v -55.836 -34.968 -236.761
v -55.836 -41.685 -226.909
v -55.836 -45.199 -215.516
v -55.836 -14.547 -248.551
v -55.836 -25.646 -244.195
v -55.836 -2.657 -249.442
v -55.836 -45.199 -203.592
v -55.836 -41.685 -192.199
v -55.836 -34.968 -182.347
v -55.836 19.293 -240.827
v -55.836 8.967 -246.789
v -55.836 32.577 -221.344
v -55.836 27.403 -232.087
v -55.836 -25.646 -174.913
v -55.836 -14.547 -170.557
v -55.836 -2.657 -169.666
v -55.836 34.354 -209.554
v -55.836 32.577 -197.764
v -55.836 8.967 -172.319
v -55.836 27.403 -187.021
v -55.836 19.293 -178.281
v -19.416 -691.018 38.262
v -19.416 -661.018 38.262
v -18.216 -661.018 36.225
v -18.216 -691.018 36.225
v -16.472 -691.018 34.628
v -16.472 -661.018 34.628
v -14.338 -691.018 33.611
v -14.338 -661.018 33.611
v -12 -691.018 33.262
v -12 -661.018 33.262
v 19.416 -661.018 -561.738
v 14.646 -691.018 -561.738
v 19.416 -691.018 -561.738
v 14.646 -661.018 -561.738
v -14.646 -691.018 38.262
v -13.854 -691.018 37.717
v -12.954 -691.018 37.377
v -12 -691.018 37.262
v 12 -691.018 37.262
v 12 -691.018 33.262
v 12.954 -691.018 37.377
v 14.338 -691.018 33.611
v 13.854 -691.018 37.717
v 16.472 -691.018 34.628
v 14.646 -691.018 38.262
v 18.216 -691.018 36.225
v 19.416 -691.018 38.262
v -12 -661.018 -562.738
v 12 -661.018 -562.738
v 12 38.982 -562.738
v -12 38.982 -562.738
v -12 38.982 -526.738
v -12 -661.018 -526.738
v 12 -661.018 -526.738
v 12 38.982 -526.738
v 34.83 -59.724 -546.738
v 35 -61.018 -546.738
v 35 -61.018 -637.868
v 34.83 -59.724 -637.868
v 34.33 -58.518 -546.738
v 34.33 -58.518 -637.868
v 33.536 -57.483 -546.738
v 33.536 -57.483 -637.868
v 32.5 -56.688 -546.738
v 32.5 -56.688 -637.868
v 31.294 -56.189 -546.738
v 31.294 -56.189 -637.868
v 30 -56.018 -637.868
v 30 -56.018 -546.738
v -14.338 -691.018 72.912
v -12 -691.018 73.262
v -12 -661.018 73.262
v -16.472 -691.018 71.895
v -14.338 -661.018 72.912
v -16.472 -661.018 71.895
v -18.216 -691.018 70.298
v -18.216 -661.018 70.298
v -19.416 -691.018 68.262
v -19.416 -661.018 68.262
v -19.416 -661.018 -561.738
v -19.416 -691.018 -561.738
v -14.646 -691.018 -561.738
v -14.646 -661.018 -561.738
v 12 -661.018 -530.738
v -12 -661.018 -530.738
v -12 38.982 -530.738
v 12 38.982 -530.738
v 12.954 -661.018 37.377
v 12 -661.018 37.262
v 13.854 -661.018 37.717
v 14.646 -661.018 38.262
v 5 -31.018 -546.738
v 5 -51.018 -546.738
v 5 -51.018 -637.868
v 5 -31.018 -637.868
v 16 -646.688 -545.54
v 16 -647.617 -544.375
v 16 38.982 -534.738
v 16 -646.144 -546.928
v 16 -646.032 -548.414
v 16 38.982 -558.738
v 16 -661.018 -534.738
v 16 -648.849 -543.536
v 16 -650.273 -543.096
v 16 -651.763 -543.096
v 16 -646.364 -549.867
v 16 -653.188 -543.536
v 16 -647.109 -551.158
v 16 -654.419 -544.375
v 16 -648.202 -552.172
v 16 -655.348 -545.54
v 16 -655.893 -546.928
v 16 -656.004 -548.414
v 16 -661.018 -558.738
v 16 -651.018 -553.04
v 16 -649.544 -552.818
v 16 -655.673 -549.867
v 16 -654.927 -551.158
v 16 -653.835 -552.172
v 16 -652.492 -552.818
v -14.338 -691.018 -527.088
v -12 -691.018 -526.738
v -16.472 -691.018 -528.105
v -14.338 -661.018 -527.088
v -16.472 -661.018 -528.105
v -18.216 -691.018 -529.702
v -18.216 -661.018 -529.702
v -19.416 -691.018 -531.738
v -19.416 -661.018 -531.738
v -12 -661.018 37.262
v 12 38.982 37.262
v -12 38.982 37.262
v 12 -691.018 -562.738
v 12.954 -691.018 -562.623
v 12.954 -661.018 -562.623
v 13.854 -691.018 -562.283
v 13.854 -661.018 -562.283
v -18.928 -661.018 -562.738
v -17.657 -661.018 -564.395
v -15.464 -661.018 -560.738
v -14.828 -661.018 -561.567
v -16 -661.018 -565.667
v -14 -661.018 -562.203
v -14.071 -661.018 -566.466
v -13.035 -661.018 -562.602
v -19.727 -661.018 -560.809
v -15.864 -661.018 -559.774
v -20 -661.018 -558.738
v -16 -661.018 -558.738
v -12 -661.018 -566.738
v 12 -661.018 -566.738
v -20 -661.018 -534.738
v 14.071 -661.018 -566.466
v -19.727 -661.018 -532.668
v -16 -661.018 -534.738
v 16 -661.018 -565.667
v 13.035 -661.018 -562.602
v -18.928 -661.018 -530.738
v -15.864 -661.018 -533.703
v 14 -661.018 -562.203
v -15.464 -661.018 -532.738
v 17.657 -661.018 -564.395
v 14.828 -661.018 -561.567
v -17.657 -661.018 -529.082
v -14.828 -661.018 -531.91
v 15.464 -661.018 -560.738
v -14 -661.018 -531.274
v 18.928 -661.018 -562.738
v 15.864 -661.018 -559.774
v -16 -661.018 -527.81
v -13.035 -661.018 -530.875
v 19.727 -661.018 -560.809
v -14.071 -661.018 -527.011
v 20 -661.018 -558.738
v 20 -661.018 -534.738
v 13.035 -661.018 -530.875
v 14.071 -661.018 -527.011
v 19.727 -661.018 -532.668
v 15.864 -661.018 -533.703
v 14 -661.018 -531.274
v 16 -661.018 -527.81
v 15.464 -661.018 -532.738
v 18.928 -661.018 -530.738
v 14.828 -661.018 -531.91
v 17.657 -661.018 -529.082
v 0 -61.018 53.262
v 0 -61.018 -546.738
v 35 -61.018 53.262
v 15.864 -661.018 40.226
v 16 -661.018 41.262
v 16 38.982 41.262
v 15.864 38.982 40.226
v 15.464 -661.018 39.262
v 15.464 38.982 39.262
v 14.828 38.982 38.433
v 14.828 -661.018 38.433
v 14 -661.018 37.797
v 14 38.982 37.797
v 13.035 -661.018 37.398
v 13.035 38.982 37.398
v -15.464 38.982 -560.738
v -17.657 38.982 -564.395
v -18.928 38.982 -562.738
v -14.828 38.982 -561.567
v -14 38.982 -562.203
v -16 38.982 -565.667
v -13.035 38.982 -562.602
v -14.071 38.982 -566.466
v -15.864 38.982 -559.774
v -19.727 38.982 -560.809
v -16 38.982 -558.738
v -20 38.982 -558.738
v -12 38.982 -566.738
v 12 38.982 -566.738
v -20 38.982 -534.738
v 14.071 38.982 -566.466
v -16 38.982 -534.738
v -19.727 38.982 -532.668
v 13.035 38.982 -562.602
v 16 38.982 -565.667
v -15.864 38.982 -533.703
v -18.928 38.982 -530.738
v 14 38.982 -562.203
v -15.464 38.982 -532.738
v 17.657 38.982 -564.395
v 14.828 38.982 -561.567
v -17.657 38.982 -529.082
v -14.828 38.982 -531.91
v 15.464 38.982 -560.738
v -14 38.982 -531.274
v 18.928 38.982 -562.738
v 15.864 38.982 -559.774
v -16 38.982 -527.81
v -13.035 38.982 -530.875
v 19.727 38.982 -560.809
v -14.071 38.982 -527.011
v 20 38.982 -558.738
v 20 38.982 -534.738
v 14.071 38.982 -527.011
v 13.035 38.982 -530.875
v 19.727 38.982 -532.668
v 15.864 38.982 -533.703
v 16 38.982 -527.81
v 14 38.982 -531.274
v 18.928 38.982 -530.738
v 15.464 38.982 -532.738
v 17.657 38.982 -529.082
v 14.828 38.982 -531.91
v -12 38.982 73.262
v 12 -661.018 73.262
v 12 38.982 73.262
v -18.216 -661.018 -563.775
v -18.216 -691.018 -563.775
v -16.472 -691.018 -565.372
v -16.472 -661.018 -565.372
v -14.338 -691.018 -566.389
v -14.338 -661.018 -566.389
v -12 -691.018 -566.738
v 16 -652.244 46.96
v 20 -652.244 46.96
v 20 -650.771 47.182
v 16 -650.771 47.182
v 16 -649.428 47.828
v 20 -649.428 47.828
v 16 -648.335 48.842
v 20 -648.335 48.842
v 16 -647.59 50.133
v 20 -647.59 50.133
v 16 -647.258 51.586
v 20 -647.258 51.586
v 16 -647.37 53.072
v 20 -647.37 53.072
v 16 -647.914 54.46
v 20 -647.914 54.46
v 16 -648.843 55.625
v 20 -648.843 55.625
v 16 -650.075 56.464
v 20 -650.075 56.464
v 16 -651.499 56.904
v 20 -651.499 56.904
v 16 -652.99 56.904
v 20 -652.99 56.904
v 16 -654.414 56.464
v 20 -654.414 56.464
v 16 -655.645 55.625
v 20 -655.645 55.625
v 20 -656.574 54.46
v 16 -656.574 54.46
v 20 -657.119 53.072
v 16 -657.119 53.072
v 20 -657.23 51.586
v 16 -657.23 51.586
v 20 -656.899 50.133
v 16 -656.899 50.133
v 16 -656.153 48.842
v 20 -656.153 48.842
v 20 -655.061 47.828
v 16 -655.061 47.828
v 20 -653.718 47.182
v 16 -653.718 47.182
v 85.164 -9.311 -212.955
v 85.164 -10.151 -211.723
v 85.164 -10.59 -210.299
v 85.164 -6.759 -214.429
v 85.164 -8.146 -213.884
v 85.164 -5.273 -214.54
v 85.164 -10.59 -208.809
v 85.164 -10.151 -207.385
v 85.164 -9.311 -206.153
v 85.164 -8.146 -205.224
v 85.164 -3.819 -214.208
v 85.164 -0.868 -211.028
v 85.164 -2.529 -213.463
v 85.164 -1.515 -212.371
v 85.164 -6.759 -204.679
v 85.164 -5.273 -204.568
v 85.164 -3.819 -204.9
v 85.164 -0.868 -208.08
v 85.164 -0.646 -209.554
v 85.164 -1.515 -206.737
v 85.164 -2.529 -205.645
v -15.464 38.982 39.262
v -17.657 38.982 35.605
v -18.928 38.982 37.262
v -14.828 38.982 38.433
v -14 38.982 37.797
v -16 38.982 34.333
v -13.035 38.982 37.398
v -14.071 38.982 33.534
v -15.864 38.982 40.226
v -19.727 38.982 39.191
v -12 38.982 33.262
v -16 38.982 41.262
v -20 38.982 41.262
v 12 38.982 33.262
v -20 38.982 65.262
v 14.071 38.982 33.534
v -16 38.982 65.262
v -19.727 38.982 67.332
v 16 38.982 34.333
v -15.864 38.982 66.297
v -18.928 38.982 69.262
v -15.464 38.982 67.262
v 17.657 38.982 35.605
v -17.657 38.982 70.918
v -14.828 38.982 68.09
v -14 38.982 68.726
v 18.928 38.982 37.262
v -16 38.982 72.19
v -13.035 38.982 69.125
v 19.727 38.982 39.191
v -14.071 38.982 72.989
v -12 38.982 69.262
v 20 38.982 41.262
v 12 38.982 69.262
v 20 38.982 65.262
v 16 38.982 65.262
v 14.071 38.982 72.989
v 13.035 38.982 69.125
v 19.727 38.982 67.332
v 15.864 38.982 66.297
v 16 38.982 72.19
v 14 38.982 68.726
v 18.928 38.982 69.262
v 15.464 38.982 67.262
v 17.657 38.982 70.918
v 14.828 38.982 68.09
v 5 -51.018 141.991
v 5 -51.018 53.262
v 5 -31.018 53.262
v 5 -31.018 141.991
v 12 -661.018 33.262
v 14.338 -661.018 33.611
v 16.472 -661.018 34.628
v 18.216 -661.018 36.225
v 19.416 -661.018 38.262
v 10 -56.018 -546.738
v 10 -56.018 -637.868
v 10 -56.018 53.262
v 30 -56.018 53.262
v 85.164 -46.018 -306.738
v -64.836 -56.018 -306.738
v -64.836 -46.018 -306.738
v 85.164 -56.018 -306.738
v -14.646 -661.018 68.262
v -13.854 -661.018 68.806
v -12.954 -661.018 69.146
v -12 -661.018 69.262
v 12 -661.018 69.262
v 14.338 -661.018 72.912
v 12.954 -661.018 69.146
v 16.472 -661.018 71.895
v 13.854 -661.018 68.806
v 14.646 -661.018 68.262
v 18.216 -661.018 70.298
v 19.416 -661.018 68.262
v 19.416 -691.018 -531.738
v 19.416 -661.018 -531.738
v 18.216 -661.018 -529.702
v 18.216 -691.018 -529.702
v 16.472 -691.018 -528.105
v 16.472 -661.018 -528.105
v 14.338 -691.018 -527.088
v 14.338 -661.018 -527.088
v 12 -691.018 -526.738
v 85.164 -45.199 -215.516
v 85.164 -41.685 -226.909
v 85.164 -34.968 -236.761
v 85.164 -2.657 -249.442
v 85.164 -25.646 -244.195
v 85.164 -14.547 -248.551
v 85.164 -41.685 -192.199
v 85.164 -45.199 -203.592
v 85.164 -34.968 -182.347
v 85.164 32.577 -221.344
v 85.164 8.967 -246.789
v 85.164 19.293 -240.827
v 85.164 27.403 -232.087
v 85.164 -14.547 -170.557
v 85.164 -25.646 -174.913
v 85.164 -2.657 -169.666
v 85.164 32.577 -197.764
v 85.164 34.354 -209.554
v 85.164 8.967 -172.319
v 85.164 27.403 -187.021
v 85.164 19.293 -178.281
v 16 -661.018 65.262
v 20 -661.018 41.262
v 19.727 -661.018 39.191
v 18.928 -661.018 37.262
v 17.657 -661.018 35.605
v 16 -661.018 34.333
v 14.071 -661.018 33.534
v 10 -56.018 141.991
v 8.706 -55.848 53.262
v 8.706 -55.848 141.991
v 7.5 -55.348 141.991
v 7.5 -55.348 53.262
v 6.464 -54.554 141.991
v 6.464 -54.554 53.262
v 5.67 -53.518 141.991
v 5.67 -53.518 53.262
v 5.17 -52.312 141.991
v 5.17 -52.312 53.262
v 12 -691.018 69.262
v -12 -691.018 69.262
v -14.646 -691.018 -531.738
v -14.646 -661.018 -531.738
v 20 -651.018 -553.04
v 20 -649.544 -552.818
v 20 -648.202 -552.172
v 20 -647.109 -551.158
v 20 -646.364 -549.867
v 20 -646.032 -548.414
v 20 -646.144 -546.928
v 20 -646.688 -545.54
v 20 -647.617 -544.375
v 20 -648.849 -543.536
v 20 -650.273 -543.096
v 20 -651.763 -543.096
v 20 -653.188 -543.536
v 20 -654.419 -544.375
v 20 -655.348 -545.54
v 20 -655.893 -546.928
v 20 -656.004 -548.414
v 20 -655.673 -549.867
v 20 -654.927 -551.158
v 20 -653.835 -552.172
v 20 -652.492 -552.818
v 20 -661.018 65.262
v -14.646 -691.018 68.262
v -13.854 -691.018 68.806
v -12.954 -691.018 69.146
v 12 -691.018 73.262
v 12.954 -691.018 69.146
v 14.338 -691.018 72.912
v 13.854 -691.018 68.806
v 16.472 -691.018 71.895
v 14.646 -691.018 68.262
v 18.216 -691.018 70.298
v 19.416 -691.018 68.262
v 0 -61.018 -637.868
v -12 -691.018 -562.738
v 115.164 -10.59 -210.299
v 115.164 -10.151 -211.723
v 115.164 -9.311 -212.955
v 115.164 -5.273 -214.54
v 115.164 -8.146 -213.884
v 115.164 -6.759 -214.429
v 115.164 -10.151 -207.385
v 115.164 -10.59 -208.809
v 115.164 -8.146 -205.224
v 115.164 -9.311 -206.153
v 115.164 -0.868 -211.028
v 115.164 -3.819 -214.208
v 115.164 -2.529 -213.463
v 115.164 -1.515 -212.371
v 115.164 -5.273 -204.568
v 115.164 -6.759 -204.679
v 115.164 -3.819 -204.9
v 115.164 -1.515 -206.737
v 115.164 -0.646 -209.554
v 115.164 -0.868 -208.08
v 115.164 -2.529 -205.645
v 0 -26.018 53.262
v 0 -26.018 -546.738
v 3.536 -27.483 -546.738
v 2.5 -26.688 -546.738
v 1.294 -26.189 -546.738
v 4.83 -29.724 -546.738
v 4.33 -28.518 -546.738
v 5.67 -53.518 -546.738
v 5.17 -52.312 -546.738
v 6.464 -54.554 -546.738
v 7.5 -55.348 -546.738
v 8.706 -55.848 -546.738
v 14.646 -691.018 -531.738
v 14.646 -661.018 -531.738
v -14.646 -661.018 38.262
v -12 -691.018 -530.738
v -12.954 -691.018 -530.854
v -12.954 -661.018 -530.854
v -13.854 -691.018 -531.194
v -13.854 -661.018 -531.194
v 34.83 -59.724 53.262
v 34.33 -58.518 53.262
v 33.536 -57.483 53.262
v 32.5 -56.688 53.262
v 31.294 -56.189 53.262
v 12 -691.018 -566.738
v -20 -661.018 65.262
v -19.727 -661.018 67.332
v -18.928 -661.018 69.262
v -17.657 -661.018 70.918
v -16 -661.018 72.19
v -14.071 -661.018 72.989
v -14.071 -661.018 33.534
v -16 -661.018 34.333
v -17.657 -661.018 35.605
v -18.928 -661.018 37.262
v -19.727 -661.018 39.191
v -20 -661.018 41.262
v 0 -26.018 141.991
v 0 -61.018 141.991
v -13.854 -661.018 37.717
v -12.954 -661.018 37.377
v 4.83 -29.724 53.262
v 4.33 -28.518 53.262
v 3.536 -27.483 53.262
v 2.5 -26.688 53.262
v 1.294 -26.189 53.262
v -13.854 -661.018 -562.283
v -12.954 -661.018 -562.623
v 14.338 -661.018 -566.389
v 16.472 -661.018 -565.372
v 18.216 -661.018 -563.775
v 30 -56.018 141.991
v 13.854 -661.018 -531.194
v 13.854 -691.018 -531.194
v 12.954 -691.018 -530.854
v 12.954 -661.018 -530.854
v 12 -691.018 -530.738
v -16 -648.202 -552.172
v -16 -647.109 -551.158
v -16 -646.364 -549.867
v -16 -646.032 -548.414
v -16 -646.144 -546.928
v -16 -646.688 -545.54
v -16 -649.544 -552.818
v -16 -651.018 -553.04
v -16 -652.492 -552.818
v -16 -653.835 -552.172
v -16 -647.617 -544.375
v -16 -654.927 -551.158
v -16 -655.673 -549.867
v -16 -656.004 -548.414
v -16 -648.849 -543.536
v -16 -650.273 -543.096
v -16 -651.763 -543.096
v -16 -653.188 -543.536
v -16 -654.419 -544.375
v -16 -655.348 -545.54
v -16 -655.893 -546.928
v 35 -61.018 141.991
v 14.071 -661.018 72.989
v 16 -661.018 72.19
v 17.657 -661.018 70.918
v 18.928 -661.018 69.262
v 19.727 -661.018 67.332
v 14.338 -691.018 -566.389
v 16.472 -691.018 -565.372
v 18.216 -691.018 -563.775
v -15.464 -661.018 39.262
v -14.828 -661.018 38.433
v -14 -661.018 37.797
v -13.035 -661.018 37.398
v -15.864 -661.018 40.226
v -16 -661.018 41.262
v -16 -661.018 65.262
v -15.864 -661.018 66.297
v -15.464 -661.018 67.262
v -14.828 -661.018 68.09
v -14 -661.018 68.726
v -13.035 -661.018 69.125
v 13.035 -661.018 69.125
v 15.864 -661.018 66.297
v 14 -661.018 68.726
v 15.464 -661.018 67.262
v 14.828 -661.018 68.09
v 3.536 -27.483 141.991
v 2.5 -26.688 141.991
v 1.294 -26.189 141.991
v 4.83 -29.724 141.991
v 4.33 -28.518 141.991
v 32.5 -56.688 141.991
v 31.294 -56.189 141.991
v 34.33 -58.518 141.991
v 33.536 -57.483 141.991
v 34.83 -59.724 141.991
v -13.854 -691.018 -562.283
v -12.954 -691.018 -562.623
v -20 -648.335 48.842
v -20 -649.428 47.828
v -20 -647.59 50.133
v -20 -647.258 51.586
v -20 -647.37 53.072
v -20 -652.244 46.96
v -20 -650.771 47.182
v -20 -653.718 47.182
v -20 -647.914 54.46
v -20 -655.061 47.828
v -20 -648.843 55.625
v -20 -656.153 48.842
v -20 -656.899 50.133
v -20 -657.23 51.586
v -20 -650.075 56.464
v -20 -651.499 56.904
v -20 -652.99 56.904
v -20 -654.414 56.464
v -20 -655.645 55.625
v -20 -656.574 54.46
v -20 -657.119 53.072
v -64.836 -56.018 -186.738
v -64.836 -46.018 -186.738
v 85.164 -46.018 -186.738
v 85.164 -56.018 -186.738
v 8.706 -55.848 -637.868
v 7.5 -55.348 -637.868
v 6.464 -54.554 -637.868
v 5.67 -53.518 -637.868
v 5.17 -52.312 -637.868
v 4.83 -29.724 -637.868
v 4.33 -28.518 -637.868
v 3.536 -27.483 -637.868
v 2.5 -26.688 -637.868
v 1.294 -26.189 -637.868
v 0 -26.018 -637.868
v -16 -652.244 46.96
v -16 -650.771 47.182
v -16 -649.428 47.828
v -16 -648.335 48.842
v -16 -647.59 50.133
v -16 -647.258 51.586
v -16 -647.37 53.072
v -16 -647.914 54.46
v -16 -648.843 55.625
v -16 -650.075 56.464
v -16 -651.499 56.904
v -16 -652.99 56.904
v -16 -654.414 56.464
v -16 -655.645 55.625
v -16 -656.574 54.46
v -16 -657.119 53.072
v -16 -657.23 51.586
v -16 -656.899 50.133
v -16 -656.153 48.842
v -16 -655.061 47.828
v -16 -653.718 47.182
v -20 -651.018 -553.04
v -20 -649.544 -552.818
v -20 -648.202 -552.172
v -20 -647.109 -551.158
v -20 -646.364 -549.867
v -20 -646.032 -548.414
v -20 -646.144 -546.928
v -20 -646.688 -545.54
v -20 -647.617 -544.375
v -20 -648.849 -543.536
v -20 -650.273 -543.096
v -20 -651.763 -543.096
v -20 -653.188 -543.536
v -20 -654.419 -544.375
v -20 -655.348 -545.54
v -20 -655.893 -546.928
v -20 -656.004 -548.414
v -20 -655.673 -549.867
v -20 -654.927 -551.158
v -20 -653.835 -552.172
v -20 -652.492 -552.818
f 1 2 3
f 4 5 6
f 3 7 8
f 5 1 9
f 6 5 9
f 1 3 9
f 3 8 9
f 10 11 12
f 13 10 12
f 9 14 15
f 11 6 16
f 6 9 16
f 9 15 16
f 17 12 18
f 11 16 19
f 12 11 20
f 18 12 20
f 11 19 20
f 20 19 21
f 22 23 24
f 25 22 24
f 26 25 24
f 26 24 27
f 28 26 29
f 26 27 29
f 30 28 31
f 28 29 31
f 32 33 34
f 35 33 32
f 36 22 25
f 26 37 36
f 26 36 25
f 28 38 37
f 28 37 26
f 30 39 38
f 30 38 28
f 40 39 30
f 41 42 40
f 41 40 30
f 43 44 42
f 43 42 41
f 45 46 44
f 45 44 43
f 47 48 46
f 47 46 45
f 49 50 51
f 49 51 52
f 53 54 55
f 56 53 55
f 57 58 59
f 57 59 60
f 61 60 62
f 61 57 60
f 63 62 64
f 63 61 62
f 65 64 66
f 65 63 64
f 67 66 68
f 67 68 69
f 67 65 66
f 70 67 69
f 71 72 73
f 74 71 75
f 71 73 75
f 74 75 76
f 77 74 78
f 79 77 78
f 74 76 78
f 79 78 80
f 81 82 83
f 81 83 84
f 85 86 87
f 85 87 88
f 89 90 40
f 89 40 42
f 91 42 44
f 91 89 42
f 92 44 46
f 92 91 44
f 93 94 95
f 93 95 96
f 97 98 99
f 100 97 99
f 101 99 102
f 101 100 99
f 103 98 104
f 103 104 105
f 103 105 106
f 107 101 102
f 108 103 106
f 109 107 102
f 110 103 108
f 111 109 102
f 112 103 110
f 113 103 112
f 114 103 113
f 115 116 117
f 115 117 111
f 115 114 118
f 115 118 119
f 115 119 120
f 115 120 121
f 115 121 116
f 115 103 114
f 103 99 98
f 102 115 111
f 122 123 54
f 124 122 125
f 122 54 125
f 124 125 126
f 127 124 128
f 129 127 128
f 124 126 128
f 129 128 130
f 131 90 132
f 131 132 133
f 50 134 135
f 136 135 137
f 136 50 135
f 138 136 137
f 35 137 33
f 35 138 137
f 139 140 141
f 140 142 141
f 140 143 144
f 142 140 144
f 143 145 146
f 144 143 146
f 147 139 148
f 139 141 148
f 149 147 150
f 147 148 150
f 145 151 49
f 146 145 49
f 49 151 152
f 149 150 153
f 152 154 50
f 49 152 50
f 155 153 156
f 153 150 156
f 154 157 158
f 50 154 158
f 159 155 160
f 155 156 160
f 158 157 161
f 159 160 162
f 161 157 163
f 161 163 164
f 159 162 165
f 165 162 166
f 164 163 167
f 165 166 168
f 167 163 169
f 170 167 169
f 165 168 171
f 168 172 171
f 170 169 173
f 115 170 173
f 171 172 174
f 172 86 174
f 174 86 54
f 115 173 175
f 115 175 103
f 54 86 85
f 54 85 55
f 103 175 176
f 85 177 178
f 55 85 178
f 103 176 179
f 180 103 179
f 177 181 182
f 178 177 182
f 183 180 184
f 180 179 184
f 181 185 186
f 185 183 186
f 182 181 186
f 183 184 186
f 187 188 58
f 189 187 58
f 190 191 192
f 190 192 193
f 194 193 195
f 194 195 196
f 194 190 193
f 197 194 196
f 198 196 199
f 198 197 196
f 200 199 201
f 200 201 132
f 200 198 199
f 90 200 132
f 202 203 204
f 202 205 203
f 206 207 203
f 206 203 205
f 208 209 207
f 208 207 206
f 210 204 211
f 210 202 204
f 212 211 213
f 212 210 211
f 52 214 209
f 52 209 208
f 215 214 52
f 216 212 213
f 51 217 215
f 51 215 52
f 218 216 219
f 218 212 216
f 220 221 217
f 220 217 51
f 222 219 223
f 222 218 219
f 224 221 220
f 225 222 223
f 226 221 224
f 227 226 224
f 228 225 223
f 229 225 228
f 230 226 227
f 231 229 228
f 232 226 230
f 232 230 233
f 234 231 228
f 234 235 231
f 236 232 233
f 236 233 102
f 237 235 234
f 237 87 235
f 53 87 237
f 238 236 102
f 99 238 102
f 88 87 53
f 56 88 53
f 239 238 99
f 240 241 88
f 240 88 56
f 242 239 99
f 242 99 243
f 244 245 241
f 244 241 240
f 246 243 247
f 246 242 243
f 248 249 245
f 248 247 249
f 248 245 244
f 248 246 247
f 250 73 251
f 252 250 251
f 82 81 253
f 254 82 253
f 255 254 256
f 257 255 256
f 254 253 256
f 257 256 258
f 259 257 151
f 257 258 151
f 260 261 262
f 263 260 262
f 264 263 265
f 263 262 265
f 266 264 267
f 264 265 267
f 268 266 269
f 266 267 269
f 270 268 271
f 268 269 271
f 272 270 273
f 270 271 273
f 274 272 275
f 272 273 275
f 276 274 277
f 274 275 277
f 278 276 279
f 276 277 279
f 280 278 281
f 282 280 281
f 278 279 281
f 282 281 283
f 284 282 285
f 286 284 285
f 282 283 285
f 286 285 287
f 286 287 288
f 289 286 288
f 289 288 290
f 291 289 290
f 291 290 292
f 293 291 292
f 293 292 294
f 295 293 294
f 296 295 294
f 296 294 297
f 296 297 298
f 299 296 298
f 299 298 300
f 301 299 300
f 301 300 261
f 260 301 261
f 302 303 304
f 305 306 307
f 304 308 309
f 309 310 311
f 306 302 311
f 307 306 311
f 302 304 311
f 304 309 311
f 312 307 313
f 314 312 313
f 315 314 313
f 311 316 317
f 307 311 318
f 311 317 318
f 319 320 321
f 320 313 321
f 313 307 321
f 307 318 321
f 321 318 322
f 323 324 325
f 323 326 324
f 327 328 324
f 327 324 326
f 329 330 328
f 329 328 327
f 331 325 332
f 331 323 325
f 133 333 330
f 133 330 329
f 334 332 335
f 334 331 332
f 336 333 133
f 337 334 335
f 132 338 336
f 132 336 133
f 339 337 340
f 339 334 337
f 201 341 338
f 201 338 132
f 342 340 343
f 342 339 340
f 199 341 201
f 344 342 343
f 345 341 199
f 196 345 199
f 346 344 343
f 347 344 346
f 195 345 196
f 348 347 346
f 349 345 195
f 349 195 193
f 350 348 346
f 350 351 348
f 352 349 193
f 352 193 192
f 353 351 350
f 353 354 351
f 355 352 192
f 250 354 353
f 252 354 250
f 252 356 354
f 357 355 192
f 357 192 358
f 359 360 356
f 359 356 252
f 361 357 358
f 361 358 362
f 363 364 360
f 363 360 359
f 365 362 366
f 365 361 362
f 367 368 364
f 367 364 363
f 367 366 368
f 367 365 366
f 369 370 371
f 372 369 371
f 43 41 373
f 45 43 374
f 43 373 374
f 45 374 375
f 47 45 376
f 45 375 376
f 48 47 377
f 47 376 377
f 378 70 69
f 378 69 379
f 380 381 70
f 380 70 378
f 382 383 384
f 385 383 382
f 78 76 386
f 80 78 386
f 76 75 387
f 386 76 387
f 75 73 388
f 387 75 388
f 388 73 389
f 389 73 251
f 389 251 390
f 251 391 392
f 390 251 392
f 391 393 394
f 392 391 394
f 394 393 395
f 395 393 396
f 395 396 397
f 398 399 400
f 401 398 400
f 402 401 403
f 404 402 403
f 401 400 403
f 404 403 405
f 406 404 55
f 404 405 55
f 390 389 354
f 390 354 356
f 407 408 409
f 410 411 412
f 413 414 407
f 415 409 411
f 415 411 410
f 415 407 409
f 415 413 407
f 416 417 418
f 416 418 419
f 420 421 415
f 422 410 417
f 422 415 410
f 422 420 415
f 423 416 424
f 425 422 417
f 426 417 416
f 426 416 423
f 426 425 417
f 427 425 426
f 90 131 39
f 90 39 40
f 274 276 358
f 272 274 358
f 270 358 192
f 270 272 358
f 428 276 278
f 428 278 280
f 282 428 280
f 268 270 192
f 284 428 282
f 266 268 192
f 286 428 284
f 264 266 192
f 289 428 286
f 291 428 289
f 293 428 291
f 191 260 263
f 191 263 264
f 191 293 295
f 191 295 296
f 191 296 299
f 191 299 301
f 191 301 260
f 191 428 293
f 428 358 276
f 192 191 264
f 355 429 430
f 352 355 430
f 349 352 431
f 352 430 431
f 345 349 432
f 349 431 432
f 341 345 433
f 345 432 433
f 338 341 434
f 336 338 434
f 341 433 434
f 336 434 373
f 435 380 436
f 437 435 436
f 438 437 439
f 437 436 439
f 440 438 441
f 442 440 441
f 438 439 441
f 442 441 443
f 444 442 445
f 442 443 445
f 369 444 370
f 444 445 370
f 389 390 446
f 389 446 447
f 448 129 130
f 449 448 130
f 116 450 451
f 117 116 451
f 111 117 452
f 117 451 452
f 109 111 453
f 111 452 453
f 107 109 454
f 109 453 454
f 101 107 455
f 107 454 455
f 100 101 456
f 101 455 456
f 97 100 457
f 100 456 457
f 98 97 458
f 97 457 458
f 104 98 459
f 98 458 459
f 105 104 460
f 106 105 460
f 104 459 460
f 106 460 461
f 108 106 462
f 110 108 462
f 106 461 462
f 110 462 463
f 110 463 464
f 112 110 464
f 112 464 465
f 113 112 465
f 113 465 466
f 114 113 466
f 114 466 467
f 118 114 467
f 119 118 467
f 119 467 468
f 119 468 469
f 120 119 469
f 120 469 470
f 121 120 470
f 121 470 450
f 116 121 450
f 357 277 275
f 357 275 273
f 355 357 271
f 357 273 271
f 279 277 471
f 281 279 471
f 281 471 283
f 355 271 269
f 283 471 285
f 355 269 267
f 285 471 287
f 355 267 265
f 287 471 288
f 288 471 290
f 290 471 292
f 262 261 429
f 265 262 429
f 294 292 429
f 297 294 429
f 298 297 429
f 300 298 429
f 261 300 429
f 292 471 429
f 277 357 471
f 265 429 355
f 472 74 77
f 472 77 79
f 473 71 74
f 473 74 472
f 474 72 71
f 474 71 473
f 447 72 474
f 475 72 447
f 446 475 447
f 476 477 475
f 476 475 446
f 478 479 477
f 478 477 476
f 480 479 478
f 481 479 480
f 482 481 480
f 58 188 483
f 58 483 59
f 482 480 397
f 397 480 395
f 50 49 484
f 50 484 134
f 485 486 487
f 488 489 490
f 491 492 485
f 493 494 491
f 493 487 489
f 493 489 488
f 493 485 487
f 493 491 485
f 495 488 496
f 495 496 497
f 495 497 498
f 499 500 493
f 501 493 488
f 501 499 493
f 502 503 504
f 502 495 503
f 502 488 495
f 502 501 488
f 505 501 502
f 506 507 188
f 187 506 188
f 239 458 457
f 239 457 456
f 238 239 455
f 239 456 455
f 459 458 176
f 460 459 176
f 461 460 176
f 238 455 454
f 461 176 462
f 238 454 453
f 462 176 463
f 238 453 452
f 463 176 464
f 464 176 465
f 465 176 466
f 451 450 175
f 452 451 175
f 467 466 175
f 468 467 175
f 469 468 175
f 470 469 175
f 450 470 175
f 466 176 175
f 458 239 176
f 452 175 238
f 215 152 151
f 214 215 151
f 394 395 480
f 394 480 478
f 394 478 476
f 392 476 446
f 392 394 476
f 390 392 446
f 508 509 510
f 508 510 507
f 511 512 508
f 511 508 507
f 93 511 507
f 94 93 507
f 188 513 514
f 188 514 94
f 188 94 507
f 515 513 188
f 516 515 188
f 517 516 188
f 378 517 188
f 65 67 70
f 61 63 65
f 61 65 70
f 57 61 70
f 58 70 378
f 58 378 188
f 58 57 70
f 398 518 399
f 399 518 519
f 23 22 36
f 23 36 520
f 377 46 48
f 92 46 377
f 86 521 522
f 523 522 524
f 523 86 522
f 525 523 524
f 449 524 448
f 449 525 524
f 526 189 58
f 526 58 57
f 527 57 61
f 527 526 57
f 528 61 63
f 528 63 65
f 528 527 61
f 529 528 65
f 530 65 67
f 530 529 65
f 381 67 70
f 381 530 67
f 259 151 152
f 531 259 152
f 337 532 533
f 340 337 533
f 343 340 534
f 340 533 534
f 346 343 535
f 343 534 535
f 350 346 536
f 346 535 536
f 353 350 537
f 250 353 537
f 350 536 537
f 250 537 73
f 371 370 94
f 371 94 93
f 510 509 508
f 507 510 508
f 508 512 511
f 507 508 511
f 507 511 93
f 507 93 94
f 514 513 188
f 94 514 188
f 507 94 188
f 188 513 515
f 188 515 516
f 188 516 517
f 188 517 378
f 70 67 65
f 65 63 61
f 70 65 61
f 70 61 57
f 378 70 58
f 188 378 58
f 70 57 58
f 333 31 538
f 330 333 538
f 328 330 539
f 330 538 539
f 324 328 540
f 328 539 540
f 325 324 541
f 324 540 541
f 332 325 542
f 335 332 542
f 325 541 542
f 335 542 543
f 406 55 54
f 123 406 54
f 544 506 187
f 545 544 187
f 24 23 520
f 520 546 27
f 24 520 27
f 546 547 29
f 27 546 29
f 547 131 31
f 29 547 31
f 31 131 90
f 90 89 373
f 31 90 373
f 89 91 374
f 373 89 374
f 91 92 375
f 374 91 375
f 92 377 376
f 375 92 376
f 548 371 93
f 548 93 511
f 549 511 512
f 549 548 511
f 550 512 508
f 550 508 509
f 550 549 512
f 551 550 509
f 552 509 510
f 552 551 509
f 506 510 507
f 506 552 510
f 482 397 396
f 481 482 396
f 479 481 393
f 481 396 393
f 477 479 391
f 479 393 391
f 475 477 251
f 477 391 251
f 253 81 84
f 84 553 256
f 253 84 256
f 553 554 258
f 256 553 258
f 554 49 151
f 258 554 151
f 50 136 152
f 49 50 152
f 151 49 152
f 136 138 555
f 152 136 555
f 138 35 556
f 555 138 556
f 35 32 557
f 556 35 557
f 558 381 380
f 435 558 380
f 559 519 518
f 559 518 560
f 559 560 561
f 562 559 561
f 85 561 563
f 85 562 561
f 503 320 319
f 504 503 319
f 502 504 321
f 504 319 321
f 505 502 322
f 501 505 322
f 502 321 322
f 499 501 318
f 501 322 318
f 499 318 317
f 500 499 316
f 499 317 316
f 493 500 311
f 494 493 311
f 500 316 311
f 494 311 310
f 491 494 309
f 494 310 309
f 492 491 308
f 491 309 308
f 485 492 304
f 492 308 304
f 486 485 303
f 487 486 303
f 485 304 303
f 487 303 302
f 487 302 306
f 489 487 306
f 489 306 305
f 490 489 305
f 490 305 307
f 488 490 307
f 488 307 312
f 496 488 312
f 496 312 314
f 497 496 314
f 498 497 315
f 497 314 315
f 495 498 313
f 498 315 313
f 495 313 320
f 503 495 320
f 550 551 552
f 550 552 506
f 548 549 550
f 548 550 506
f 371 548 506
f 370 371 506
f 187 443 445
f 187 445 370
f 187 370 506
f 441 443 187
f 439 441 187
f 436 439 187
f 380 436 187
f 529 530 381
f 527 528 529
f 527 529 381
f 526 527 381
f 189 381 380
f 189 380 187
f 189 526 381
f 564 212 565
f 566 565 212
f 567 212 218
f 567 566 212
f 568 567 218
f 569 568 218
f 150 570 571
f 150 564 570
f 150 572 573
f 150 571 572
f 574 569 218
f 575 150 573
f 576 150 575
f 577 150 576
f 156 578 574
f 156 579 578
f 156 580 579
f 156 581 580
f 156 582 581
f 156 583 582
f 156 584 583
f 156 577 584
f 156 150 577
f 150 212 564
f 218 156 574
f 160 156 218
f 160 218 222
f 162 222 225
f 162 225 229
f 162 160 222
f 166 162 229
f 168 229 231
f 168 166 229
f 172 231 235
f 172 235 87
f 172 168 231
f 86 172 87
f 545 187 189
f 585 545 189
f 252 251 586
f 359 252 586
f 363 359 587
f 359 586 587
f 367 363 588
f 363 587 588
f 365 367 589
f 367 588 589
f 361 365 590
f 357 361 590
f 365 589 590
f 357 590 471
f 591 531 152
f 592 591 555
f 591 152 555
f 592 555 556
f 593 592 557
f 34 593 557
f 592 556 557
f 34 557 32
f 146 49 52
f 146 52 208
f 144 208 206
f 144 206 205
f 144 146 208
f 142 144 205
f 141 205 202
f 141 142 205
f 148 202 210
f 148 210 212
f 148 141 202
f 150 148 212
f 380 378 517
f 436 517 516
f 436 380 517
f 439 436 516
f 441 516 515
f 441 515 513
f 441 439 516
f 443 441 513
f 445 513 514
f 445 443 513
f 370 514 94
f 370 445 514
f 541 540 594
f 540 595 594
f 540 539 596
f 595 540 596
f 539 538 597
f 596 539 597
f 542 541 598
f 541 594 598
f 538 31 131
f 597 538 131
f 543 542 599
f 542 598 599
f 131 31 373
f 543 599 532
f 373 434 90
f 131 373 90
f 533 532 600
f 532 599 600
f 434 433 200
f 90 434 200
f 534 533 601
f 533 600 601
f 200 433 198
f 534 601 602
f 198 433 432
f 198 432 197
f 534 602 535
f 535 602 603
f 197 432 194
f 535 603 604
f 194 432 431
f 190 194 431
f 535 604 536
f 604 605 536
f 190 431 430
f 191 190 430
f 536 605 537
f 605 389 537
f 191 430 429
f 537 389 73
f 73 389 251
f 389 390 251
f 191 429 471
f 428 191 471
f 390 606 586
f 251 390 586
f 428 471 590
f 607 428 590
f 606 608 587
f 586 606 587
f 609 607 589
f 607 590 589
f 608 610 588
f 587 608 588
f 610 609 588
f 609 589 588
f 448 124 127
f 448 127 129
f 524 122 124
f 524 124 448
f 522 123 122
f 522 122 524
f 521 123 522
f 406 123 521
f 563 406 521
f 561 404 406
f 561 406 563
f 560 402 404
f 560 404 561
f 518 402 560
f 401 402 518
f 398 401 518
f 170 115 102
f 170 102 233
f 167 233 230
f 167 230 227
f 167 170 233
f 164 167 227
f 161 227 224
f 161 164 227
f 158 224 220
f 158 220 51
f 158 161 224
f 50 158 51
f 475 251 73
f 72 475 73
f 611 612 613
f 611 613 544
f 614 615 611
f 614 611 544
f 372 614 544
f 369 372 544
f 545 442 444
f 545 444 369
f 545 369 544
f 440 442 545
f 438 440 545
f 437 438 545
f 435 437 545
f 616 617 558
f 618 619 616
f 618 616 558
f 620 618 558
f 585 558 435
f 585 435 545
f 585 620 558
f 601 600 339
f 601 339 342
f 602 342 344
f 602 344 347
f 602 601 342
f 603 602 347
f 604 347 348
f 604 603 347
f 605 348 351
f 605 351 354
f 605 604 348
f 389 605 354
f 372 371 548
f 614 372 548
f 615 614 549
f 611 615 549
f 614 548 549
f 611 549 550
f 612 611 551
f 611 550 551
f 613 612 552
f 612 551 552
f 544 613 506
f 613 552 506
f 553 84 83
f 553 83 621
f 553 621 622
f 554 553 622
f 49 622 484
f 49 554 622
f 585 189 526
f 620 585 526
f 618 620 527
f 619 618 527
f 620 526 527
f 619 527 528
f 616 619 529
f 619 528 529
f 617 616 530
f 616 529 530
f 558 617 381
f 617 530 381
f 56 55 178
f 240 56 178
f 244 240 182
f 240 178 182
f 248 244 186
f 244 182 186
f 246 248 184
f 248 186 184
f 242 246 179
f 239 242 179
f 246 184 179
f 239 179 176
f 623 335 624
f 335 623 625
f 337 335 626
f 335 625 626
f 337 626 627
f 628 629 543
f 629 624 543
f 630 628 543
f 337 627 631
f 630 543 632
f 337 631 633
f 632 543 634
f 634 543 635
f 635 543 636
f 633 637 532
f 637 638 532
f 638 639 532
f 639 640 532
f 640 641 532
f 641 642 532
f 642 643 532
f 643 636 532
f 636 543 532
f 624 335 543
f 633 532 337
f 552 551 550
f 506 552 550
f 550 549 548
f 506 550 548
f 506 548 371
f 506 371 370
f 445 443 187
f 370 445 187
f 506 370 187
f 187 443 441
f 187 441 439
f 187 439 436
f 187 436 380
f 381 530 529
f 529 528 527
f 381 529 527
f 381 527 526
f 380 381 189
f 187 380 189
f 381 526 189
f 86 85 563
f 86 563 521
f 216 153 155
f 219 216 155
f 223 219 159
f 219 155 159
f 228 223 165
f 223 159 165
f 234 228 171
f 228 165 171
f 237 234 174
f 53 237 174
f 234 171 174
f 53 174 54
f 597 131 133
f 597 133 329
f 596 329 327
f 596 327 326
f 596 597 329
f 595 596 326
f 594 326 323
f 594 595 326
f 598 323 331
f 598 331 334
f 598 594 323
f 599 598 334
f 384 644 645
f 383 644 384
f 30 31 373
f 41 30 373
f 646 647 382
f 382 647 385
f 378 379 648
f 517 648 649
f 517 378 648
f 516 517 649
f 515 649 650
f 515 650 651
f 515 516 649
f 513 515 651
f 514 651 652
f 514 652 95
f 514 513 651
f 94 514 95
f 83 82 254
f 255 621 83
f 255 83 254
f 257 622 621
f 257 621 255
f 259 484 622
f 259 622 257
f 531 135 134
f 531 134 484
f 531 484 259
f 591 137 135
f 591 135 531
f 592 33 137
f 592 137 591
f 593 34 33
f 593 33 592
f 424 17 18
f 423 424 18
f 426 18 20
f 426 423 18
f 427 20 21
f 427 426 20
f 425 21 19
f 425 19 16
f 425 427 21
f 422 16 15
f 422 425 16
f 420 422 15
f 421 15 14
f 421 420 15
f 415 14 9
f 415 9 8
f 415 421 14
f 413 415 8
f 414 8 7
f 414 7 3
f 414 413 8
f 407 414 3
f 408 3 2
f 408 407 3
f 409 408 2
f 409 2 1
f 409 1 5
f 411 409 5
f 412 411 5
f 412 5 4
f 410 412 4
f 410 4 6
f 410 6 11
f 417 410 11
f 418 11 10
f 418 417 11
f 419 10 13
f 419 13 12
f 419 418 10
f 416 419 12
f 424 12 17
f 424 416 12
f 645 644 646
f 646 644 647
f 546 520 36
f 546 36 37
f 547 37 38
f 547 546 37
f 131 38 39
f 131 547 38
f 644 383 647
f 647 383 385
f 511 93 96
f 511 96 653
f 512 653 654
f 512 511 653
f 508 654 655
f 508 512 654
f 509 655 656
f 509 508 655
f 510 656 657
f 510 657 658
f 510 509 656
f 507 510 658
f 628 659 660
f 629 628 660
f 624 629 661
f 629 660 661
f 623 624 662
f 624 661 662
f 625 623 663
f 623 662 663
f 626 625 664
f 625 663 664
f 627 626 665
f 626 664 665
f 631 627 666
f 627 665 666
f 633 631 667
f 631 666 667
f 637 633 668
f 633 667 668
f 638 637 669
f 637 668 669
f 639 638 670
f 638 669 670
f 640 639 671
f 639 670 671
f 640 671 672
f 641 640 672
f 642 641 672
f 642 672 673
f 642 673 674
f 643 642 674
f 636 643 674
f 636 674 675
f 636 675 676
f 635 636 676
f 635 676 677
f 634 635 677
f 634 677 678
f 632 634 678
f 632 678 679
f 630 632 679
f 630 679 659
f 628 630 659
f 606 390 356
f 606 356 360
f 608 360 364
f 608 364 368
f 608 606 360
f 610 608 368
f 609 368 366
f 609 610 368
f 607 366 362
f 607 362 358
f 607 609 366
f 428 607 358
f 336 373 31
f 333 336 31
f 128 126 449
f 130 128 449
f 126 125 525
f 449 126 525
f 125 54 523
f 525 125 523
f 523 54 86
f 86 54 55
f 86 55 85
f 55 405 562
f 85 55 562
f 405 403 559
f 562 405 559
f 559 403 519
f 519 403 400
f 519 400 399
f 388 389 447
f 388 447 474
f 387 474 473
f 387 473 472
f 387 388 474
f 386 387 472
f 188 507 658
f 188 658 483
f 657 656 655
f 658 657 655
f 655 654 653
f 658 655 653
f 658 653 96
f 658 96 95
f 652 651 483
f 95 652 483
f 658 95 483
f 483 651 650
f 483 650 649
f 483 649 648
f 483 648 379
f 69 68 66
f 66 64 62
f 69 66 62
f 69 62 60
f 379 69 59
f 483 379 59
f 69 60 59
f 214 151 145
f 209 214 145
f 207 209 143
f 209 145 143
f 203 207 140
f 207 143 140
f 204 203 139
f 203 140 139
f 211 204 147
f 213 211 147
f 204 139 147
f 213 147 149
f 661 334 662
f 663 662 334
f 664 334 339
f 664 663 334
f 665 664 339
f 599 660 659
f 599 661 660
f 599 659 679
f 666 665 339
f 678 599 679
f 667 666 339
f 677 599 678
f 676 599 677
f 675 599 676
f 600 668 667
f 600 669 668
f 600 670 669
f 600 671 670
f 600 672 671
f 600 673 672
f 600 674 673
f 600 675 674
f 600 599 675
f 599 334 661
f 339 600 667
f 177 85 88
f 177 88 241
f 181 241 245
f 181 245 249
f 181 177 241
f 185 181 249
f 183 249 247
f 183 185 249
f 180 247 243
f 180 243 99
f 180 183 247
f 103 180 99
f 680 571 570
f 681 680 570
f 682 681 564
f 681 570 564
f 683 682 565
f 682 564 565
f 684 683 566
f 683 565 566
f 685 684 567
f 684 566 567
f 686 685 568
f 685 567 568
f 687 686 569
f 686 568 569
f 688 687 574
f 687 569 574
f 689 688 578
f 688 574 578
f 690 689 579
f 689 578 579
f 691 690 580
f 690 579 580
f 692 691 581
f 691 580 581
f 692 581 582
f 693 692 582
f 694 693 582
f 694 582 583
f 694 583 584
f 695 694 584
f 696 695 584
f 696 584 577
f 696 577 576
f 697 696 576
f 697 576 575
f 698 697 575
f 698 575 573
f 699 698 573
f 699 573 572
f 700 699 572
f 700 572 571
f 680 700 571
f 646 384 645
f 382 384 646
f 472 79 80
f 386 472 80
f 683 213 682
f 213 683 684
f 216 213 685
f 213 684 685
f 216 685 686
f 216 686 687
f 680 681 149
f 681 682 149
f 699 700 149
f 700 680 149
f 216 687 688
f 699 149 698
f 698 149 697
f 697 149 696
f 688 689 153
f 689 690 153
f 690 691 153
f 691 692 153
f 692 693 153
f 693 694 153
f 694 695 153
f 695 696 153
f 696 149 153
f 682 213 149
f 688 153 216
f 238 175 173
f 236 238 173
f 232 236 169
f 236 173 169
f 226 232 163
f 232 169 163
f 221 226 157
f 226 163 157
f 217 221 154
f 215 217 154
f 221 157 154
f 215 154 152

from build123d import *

# Parameters (mm, degrees)
STRUCTURAL_MEMBER1_DEPTH   = 700
STRUCTURAL_MEMBER1_2_DEPTH = 700
STRUCTURAL_MEMBER3_DEPTH   = 30
STRUCTURAL_MEMBER3_2_DEPTH = 30
SKETCH14_W                 = 30
SKETCH14_H                 = 30
CUT_EXTRUDE1_DEPTH         = 45
SKETCH15_W                 = 30
SKETCH15_H                 = 30
CUT_EXTRUDE2_DEPTH         = 45
STRUCTURAL_MEMBER4_DEPTH   = 88.72918051
STRUCTURAL_MEMBER4_2_DEPTH = 600
STRUCTURAL_MEMBER4_3_DEPTH = 91.129530864
SKETCH111_W                = 150
SKETCH111_H                = 120
BOSS_EXTRUDE1_DEPTH        = 10
SKETCH112_R                = 40
BOSS_EXTRUDE2_DEPTH        = 141
SKETCH113_R                = 5
BOSS_EXTRUDE3_DEPTH        = 30
SKETCH114_R                = 5
CUT_EXTRUDE3_DEPTH         = 105


with BuildPart() as part:
    # Sketch11 → Structural Member1 (new body)
    with BuildSketch(Plane(origin=(0, -661.018211614, 53.261571771), x_dir=(0, 0, 1), z_dir=(0, 1, 0))):
        with BuildLine():
            Line((-12, -20), (12, -20))
            ThreePointArc((12, -20), (17.656854249, -17.656854249), (20, -12))
            Line((20, -12), (20, 12))
            ThreePointArc((20, 12), (17.656854249, 17.656854249), (12, 20))
            Line((12, 20), (-12, 20))
            ThreePointArc((-12, 20), (-17.656854249, 17.656854249), (-20, 12))
            Line((-20, 12), (-20, -12))
            ThreePointArc((-20, -12), (-17.656854249, -17.656854249), (-12, -20))
        make_face()
        with BuildLine():
            Line((-12, -16), (12, -16))
            ThreePointArc((12, -16), (14.828427125, -14.828427125), (16, -12))
            Line((16, -12), (16, 12))
            ThreePointArc((16, 12), (14.828427125, 14.828427125), (12, 16))
            Line((12, 16), (-12, 16))
            ThreePointArc((-12, 16), (-14.828427125, 14.828427125), (-16, 12))
            Line((-16, 12), (-16, -12))
            ThreePointArc((-16, -12), (-14.828427125, -14.828427125), (-12, -16))
        make_face(mode=Mode.SUBTRACT)
    extrude(amount=STRUCTURAL_MEMBER1_DEPTH)


with BuildPart() as body_2:
    # Sketch11 on segment 2 (carried to segment 2) → Structural Member1 2 (new body)
    with BuildSketch(Plane(origin=(0, -661.018211614, -546.738428229), x_dir=(0, 0, 1), z_dir=(0, 1, 0))):
        with BuildLine():
            Line((-12, -20), (12, -20))
            ThreePointArc((12, -20), (17.656854249, -17.656854249), (20, -12))
            Line((20, -12), (20, 12))
            ThreePointArc((20, 12), (17.656854249, 17.656854249), (12, 20))
            Line((12, 20), (-12, 20))
            ThreePointArc((-12, 20), (-17.656854249, 17.656854249), (-20, 12))
            Line((-20, 12), (-20, -12))
            ThreePointArc((-20, -12), (-17.656854249, -17.656854249), (-12, -20))
        make_face()
        with BuildLine():
            Line((-12, -16), (12, -16))
            ThreePointArc((12, -16), (14.828427125, -14.828427125), (16, -12))
            Line((16, -12), (16, 12))
            ThreePointArc((16, 12), (14.828427125, 14.828427125), (12, 16))
            Line((12, 16), (-12, 16))
            ThreePointArc((-12, 16), (-14.828427125, 14.828427125), (-16, 12))
            Line((-16, 12), (-16, -12))
            ThreePointArc((-16, -12), (-14.828427125, -14.828427125), (-12, -16))
        make_face(mode=Mode.SUBTRACT)
    extrude(amount=STRUCTURAL_MEMBER1_2_DEPTH)


with BuildPart() as body_3:
    # Sketch13 → Structural Member3 (new body)
    with BuildSketch(Plane(origin=(0, -661.018211614, 53.261571771), x_dir=(0, 0, -1), z_dir=(0, -1, 0))):
        with BuildLine():
            Line((-12, -20), (12, -20))
            ThreePointArc((12, -20), (17.656854249, -17.656854249), (20, -12))
            Line((20, -12), (20, 12))
            ThreePointArc((20, 12), (17.656854249, 17.656854249), (12, 20))
            Line((12, 20), (-12, 20))
            ThreePointArc((-12, 20), (-17.656854249, 17.656854249), (-20, 12))
            Line((-20, 12), (-20, -12))
            ThreePointArc((-20, -12), (-17.656854249, -17.656854249), (-12, -20))
        make_face()
        with BuildLine():
            Line((-12, -16), (12, -16))
            ThreePointArc((12, -16), (14.828427125, -14.828427125), (16, -12))
            Line((16, -12), (16, 12))
            ThreePointArc((16, 12), (14.828427125, 14.828427125), (12, 16))
            Line((12, 16), (-12, 16))
            ThreePointArc((-12, 16), (-14.828427125, 14.828427125), (-16, 12))
            Line((-16, 12), (-16, -12))
            ThreePointArc((-16, -12), (-14.828427125, -14.828427125), (-12, -16))
        make_face(mode=Mode.SUBTRACT)
    extrude(amount=STRUCTURAL_MEMBER3_DEPTH)

    # Sketch15 → Cut-Extrude2 (cut)
    with BuildSketch(Plane.ZY.offset(20)):
        with Locations((53.261571771, -676.018211614)):
            Rectangle(SKETCH15_W, SKETCH15_H)
    extrude(amount=-CUT_EXTRUDE2_DEPTH, mode=Mode.SUBTRACT)


with BuildPart() as body_4:
    # Sketch13 on segment 2 (carried to segment 2) → Structural Member3 2 (new body)
    with BuildSketch(Plane(origin=(0, -661.018211614, -546.738428229), x_dir=(0, 0, -1), z_dir=(0, -1, 0))):
        with BuildLine():
            Line((-12, -20), (12, -20))
            ThreePointArc((12, -20), (17.656854249, -17.656854249), (20, -12))
            Line((20, -12), (20, 12))
            ThreePointArc((20, 12), (17.656854249, 17.656854249), (12, 20))
            Line((12, 20), (-12, 20))
            ThreePointArc((-12, 20), (-17.656854249, 17.656854249), (-20, 12))
            Line((-20, 12), (-20, -12))
            ThreePointArc((-20, -12), (-17.656854249, -17.656854249), (-12, -20))
        make_face()
        with BuildLine():
            Line((-12, -16), (12, -16))
            ThreePointArc((12, -16), (14.828427125, -14.828427125), (16, -12))
            Line((16, -12), (16, 12))
            ThreePointArc((16, 12), (14.828427125, 14.828427125), (12, 16))
            Line((12, 16), (-12, 16))
            ThreePointArc((-12, 16), (-14.828427125, 14.828427125), (-16, 12))
            Line((-16, 12), (-16, -12))
            ThreePointArc((-16, -12), (-14.828427125, -14.828427125), (-12, -16))
        make_face(mode=Mode.SUBTRACT)
    extrude(amount=STRUCTURAL_MEMBER3_2_DEPTH)

    # Sketch14 → Cut-Extrude1 (cut)
    with BuildSketch(Plane.ZY.offset(20)):
        with Locations((-546.738428229, -676.018211614)):
            Rectangle(SKETCH14_W, SKETCH14_H)
    extrude(amount=-CUT_EXTRUDE1_DEPTH, mode=Mode.SUBTRACT)


with BuildPart() as cut_extrude1_piece_1:
    # of the separate pieces the step leaves, piece 1, a body of its own (cut_extrude1_pieces)
    add(body_4.part.solids().sort_by_distance((-12, -661.018211614, -526.738428229))[0])


with BuildPart() as cut_extrude1_piece_2:
    # of the separate pieces the step leaves, piece 2, a body of its own (cut_extrude1_pieces)
    add(body_4.part.solids().sort_by_distance((-19.416198487, -661.018211614, -561.738428229))[0])


with BuildPart() as cut_extrude2_piece_1:
    # of the separate pieces the step leaves, piece 1, a body of its own (cut_extrude2_pieces)
    add(body_3.part.solids().sort_by_distance((-12, -661.018211614, 73.261571771))[0])


with BuildPart() as cut_extrude2_piece_2:
    # of the separate pieces the step leaves, piece 2, a body of its own (cut_extrude2_pieces)
    add(body_3.part.solids().sort_by_distance((-19.416198487, -661.018211614, 38.261571771))[0])


with BuildPart() as body_7:
    # Sketch110 → Structural Member4 (new body)
    with BuildSketch(Plane(origin=(0, -61.018211614, 53.261571771), x_dir=(0, 1, 0), z_dir=(0, 0, -1))):
        with BuildLine():
            Line((0, 0), (0, 35))
            ThreePointArc((0, 35), (3.535533906, 33.535533906), (5, 30))
            Line((5, 30), (5, 10))
            ThreePointArc((5, 10), (6.464466094, 6.464466094), (10, 5))
            Line((10, 5), (30, 5))
            ThreePointArc((30, 5), (33.535533906, 3.535533906), (35, 0))
            Line((35, 0), (0, 0))
        make_face()
    extrude(amount=-STRUCTURAL_MEMBER4_DEPTH)


with BuildPart() as body_8:
    # Sketch110 on segment 2 (carried to segment 2) → Structural Member4 2 (new body)
    with BuildSketch(Plane(origin=(0, -61.018211614, 53.261571771), x_dir=(0, 1, 0), z_dir=(0, 0, -1))):
        with BuildLine():
            Line((0, 0), (0, 35))
            ThreePointArc((0, 35), (3.535533906, 33.535533906), (5, 30))
            Line((5, 30), (5, 10))
            ThreePointArc((5, 10), (6.464466094, 6.464466094), (10, 5))
            Line((10, 5), (30, 5))
            ThreePointArc((30, 5), (33.535533906, 3.535533906), (35, 0))
            Line((35, 0), (0, 0))
        make_face()
    extrude(amount=STRUCTURAL_MEMBER4_2_DEPTH)


with BuildPart() as body_9:
    # Sketch110 on segment 3 (carried to segment 3) → Structural Member4 3 (new body)
    with BuildSketch(Plane(origin=(0, -61.018211614, -546.738428229), x_dir=(0, 1, 0), z_dir=(0, 0, -1))):
        with BuildLine():
            Line((0, 0), (0, 35))
            ThreePointArc((0, 35), (3.535533906, 33.535533906), (5, 30))
            Line((5, 30), (5, 10))
            ThreePointArc((5, 10), (6.464466094, 6.464466094), (10, 5))
            Line((10, 5), (30, 5))
            ThreePointArc((30, 5), (33.535533906, 3.535533906), (35, 0))
            Line((35, 0), (0, 0))
        make_face()
    extrude(amount=STRUCTURAL_MEMBER4_3_DEPTH)


with BuildPart() as body_10:
    # Sketch111 → Boss-Extrude1 (new body)
    with BuildSketch(Plane(origin=(0, -56.018211614, 0), x_dir=(1, 0, 0), z_dir=(0, 1, 0))):
        with Locations((10.163912746, 246.738428229)):
            Rectangle(SKETCH111_W, SKETCH111_H)
    extrude(amount=BOSS_EXTRUDE1_DEPTH)


with BuildPart() as body_11:
    # Sketch112 → Boss-Extrude2 (new body)
    with BuildSketch(Plane(origin=(85.163912746, 0, 0), x_dir=(0, 0, -1), z_dir=(1, 0, 0))):
        with Locations(Location((209.554079822, -5.646199866, 0), (0, 0, 90))):
            Circle(SKETCH112_R)
    extrude(amount=-BOSS_EXTRUDE2_DEPTH)


with BuildPart() as body_12:
    # Sketch113 → Boss-Extrude3 (new body)
    with BuildSketch(Plane(origin=(85.163912746, 0, 0), x_dir=(0, 0, -1), z_dir=(1, 0, 0))):
        with Locations(Location((209.554079822, -5.646199866, 0), (0, 0, 90))):
            Circle(SKETCH113_R)
    extrude(amount=BOSS_EXTRUDE3_DEPTH)


with BuildPart() as cut_extrude3_tool:
    # Sketch114 → Cut-Extrude3 (new body)
    with BuildSketch(Plane(origin=(20, 0, 0), x_dir=(0, 0, -1), z_dir=(1, 0, 0))):
        with Locations((548.040479498, -651.018211614)):
            Circle(SKETCH114_R)
        with Locations((-51.959520502, -652.244300255)):
            Circle(SKETCH114_R)
    extrude(amount=-CUT_EXTRUDE3_DEPTH)


with BuildPart() as part_1:
    add(part.part)

    # Cut-Extrude3: cut by cut_extrude3_tool
    add(cut_extrude3_tool.part, mode=Mode.SUBTRACT)


with BuildPart() as body_2_1:
    add(body_2.part)

    # Cut-Extrude3: cut by cut_extrude3_tool
    add(cut_extrude3_tool.part, mode=Mode.SUBTRACT)


solid = Compound([cut_extrude1_piece_1.part, cut_extrude1_piece_2.part, cut_extrude2_piece_1.part, cut_extrude2_piece_2.part, body_7.part, body_8.part, body_9.part, body_10.part, body_11.part, body_12.part, part_1.part, body_2_1.part])
